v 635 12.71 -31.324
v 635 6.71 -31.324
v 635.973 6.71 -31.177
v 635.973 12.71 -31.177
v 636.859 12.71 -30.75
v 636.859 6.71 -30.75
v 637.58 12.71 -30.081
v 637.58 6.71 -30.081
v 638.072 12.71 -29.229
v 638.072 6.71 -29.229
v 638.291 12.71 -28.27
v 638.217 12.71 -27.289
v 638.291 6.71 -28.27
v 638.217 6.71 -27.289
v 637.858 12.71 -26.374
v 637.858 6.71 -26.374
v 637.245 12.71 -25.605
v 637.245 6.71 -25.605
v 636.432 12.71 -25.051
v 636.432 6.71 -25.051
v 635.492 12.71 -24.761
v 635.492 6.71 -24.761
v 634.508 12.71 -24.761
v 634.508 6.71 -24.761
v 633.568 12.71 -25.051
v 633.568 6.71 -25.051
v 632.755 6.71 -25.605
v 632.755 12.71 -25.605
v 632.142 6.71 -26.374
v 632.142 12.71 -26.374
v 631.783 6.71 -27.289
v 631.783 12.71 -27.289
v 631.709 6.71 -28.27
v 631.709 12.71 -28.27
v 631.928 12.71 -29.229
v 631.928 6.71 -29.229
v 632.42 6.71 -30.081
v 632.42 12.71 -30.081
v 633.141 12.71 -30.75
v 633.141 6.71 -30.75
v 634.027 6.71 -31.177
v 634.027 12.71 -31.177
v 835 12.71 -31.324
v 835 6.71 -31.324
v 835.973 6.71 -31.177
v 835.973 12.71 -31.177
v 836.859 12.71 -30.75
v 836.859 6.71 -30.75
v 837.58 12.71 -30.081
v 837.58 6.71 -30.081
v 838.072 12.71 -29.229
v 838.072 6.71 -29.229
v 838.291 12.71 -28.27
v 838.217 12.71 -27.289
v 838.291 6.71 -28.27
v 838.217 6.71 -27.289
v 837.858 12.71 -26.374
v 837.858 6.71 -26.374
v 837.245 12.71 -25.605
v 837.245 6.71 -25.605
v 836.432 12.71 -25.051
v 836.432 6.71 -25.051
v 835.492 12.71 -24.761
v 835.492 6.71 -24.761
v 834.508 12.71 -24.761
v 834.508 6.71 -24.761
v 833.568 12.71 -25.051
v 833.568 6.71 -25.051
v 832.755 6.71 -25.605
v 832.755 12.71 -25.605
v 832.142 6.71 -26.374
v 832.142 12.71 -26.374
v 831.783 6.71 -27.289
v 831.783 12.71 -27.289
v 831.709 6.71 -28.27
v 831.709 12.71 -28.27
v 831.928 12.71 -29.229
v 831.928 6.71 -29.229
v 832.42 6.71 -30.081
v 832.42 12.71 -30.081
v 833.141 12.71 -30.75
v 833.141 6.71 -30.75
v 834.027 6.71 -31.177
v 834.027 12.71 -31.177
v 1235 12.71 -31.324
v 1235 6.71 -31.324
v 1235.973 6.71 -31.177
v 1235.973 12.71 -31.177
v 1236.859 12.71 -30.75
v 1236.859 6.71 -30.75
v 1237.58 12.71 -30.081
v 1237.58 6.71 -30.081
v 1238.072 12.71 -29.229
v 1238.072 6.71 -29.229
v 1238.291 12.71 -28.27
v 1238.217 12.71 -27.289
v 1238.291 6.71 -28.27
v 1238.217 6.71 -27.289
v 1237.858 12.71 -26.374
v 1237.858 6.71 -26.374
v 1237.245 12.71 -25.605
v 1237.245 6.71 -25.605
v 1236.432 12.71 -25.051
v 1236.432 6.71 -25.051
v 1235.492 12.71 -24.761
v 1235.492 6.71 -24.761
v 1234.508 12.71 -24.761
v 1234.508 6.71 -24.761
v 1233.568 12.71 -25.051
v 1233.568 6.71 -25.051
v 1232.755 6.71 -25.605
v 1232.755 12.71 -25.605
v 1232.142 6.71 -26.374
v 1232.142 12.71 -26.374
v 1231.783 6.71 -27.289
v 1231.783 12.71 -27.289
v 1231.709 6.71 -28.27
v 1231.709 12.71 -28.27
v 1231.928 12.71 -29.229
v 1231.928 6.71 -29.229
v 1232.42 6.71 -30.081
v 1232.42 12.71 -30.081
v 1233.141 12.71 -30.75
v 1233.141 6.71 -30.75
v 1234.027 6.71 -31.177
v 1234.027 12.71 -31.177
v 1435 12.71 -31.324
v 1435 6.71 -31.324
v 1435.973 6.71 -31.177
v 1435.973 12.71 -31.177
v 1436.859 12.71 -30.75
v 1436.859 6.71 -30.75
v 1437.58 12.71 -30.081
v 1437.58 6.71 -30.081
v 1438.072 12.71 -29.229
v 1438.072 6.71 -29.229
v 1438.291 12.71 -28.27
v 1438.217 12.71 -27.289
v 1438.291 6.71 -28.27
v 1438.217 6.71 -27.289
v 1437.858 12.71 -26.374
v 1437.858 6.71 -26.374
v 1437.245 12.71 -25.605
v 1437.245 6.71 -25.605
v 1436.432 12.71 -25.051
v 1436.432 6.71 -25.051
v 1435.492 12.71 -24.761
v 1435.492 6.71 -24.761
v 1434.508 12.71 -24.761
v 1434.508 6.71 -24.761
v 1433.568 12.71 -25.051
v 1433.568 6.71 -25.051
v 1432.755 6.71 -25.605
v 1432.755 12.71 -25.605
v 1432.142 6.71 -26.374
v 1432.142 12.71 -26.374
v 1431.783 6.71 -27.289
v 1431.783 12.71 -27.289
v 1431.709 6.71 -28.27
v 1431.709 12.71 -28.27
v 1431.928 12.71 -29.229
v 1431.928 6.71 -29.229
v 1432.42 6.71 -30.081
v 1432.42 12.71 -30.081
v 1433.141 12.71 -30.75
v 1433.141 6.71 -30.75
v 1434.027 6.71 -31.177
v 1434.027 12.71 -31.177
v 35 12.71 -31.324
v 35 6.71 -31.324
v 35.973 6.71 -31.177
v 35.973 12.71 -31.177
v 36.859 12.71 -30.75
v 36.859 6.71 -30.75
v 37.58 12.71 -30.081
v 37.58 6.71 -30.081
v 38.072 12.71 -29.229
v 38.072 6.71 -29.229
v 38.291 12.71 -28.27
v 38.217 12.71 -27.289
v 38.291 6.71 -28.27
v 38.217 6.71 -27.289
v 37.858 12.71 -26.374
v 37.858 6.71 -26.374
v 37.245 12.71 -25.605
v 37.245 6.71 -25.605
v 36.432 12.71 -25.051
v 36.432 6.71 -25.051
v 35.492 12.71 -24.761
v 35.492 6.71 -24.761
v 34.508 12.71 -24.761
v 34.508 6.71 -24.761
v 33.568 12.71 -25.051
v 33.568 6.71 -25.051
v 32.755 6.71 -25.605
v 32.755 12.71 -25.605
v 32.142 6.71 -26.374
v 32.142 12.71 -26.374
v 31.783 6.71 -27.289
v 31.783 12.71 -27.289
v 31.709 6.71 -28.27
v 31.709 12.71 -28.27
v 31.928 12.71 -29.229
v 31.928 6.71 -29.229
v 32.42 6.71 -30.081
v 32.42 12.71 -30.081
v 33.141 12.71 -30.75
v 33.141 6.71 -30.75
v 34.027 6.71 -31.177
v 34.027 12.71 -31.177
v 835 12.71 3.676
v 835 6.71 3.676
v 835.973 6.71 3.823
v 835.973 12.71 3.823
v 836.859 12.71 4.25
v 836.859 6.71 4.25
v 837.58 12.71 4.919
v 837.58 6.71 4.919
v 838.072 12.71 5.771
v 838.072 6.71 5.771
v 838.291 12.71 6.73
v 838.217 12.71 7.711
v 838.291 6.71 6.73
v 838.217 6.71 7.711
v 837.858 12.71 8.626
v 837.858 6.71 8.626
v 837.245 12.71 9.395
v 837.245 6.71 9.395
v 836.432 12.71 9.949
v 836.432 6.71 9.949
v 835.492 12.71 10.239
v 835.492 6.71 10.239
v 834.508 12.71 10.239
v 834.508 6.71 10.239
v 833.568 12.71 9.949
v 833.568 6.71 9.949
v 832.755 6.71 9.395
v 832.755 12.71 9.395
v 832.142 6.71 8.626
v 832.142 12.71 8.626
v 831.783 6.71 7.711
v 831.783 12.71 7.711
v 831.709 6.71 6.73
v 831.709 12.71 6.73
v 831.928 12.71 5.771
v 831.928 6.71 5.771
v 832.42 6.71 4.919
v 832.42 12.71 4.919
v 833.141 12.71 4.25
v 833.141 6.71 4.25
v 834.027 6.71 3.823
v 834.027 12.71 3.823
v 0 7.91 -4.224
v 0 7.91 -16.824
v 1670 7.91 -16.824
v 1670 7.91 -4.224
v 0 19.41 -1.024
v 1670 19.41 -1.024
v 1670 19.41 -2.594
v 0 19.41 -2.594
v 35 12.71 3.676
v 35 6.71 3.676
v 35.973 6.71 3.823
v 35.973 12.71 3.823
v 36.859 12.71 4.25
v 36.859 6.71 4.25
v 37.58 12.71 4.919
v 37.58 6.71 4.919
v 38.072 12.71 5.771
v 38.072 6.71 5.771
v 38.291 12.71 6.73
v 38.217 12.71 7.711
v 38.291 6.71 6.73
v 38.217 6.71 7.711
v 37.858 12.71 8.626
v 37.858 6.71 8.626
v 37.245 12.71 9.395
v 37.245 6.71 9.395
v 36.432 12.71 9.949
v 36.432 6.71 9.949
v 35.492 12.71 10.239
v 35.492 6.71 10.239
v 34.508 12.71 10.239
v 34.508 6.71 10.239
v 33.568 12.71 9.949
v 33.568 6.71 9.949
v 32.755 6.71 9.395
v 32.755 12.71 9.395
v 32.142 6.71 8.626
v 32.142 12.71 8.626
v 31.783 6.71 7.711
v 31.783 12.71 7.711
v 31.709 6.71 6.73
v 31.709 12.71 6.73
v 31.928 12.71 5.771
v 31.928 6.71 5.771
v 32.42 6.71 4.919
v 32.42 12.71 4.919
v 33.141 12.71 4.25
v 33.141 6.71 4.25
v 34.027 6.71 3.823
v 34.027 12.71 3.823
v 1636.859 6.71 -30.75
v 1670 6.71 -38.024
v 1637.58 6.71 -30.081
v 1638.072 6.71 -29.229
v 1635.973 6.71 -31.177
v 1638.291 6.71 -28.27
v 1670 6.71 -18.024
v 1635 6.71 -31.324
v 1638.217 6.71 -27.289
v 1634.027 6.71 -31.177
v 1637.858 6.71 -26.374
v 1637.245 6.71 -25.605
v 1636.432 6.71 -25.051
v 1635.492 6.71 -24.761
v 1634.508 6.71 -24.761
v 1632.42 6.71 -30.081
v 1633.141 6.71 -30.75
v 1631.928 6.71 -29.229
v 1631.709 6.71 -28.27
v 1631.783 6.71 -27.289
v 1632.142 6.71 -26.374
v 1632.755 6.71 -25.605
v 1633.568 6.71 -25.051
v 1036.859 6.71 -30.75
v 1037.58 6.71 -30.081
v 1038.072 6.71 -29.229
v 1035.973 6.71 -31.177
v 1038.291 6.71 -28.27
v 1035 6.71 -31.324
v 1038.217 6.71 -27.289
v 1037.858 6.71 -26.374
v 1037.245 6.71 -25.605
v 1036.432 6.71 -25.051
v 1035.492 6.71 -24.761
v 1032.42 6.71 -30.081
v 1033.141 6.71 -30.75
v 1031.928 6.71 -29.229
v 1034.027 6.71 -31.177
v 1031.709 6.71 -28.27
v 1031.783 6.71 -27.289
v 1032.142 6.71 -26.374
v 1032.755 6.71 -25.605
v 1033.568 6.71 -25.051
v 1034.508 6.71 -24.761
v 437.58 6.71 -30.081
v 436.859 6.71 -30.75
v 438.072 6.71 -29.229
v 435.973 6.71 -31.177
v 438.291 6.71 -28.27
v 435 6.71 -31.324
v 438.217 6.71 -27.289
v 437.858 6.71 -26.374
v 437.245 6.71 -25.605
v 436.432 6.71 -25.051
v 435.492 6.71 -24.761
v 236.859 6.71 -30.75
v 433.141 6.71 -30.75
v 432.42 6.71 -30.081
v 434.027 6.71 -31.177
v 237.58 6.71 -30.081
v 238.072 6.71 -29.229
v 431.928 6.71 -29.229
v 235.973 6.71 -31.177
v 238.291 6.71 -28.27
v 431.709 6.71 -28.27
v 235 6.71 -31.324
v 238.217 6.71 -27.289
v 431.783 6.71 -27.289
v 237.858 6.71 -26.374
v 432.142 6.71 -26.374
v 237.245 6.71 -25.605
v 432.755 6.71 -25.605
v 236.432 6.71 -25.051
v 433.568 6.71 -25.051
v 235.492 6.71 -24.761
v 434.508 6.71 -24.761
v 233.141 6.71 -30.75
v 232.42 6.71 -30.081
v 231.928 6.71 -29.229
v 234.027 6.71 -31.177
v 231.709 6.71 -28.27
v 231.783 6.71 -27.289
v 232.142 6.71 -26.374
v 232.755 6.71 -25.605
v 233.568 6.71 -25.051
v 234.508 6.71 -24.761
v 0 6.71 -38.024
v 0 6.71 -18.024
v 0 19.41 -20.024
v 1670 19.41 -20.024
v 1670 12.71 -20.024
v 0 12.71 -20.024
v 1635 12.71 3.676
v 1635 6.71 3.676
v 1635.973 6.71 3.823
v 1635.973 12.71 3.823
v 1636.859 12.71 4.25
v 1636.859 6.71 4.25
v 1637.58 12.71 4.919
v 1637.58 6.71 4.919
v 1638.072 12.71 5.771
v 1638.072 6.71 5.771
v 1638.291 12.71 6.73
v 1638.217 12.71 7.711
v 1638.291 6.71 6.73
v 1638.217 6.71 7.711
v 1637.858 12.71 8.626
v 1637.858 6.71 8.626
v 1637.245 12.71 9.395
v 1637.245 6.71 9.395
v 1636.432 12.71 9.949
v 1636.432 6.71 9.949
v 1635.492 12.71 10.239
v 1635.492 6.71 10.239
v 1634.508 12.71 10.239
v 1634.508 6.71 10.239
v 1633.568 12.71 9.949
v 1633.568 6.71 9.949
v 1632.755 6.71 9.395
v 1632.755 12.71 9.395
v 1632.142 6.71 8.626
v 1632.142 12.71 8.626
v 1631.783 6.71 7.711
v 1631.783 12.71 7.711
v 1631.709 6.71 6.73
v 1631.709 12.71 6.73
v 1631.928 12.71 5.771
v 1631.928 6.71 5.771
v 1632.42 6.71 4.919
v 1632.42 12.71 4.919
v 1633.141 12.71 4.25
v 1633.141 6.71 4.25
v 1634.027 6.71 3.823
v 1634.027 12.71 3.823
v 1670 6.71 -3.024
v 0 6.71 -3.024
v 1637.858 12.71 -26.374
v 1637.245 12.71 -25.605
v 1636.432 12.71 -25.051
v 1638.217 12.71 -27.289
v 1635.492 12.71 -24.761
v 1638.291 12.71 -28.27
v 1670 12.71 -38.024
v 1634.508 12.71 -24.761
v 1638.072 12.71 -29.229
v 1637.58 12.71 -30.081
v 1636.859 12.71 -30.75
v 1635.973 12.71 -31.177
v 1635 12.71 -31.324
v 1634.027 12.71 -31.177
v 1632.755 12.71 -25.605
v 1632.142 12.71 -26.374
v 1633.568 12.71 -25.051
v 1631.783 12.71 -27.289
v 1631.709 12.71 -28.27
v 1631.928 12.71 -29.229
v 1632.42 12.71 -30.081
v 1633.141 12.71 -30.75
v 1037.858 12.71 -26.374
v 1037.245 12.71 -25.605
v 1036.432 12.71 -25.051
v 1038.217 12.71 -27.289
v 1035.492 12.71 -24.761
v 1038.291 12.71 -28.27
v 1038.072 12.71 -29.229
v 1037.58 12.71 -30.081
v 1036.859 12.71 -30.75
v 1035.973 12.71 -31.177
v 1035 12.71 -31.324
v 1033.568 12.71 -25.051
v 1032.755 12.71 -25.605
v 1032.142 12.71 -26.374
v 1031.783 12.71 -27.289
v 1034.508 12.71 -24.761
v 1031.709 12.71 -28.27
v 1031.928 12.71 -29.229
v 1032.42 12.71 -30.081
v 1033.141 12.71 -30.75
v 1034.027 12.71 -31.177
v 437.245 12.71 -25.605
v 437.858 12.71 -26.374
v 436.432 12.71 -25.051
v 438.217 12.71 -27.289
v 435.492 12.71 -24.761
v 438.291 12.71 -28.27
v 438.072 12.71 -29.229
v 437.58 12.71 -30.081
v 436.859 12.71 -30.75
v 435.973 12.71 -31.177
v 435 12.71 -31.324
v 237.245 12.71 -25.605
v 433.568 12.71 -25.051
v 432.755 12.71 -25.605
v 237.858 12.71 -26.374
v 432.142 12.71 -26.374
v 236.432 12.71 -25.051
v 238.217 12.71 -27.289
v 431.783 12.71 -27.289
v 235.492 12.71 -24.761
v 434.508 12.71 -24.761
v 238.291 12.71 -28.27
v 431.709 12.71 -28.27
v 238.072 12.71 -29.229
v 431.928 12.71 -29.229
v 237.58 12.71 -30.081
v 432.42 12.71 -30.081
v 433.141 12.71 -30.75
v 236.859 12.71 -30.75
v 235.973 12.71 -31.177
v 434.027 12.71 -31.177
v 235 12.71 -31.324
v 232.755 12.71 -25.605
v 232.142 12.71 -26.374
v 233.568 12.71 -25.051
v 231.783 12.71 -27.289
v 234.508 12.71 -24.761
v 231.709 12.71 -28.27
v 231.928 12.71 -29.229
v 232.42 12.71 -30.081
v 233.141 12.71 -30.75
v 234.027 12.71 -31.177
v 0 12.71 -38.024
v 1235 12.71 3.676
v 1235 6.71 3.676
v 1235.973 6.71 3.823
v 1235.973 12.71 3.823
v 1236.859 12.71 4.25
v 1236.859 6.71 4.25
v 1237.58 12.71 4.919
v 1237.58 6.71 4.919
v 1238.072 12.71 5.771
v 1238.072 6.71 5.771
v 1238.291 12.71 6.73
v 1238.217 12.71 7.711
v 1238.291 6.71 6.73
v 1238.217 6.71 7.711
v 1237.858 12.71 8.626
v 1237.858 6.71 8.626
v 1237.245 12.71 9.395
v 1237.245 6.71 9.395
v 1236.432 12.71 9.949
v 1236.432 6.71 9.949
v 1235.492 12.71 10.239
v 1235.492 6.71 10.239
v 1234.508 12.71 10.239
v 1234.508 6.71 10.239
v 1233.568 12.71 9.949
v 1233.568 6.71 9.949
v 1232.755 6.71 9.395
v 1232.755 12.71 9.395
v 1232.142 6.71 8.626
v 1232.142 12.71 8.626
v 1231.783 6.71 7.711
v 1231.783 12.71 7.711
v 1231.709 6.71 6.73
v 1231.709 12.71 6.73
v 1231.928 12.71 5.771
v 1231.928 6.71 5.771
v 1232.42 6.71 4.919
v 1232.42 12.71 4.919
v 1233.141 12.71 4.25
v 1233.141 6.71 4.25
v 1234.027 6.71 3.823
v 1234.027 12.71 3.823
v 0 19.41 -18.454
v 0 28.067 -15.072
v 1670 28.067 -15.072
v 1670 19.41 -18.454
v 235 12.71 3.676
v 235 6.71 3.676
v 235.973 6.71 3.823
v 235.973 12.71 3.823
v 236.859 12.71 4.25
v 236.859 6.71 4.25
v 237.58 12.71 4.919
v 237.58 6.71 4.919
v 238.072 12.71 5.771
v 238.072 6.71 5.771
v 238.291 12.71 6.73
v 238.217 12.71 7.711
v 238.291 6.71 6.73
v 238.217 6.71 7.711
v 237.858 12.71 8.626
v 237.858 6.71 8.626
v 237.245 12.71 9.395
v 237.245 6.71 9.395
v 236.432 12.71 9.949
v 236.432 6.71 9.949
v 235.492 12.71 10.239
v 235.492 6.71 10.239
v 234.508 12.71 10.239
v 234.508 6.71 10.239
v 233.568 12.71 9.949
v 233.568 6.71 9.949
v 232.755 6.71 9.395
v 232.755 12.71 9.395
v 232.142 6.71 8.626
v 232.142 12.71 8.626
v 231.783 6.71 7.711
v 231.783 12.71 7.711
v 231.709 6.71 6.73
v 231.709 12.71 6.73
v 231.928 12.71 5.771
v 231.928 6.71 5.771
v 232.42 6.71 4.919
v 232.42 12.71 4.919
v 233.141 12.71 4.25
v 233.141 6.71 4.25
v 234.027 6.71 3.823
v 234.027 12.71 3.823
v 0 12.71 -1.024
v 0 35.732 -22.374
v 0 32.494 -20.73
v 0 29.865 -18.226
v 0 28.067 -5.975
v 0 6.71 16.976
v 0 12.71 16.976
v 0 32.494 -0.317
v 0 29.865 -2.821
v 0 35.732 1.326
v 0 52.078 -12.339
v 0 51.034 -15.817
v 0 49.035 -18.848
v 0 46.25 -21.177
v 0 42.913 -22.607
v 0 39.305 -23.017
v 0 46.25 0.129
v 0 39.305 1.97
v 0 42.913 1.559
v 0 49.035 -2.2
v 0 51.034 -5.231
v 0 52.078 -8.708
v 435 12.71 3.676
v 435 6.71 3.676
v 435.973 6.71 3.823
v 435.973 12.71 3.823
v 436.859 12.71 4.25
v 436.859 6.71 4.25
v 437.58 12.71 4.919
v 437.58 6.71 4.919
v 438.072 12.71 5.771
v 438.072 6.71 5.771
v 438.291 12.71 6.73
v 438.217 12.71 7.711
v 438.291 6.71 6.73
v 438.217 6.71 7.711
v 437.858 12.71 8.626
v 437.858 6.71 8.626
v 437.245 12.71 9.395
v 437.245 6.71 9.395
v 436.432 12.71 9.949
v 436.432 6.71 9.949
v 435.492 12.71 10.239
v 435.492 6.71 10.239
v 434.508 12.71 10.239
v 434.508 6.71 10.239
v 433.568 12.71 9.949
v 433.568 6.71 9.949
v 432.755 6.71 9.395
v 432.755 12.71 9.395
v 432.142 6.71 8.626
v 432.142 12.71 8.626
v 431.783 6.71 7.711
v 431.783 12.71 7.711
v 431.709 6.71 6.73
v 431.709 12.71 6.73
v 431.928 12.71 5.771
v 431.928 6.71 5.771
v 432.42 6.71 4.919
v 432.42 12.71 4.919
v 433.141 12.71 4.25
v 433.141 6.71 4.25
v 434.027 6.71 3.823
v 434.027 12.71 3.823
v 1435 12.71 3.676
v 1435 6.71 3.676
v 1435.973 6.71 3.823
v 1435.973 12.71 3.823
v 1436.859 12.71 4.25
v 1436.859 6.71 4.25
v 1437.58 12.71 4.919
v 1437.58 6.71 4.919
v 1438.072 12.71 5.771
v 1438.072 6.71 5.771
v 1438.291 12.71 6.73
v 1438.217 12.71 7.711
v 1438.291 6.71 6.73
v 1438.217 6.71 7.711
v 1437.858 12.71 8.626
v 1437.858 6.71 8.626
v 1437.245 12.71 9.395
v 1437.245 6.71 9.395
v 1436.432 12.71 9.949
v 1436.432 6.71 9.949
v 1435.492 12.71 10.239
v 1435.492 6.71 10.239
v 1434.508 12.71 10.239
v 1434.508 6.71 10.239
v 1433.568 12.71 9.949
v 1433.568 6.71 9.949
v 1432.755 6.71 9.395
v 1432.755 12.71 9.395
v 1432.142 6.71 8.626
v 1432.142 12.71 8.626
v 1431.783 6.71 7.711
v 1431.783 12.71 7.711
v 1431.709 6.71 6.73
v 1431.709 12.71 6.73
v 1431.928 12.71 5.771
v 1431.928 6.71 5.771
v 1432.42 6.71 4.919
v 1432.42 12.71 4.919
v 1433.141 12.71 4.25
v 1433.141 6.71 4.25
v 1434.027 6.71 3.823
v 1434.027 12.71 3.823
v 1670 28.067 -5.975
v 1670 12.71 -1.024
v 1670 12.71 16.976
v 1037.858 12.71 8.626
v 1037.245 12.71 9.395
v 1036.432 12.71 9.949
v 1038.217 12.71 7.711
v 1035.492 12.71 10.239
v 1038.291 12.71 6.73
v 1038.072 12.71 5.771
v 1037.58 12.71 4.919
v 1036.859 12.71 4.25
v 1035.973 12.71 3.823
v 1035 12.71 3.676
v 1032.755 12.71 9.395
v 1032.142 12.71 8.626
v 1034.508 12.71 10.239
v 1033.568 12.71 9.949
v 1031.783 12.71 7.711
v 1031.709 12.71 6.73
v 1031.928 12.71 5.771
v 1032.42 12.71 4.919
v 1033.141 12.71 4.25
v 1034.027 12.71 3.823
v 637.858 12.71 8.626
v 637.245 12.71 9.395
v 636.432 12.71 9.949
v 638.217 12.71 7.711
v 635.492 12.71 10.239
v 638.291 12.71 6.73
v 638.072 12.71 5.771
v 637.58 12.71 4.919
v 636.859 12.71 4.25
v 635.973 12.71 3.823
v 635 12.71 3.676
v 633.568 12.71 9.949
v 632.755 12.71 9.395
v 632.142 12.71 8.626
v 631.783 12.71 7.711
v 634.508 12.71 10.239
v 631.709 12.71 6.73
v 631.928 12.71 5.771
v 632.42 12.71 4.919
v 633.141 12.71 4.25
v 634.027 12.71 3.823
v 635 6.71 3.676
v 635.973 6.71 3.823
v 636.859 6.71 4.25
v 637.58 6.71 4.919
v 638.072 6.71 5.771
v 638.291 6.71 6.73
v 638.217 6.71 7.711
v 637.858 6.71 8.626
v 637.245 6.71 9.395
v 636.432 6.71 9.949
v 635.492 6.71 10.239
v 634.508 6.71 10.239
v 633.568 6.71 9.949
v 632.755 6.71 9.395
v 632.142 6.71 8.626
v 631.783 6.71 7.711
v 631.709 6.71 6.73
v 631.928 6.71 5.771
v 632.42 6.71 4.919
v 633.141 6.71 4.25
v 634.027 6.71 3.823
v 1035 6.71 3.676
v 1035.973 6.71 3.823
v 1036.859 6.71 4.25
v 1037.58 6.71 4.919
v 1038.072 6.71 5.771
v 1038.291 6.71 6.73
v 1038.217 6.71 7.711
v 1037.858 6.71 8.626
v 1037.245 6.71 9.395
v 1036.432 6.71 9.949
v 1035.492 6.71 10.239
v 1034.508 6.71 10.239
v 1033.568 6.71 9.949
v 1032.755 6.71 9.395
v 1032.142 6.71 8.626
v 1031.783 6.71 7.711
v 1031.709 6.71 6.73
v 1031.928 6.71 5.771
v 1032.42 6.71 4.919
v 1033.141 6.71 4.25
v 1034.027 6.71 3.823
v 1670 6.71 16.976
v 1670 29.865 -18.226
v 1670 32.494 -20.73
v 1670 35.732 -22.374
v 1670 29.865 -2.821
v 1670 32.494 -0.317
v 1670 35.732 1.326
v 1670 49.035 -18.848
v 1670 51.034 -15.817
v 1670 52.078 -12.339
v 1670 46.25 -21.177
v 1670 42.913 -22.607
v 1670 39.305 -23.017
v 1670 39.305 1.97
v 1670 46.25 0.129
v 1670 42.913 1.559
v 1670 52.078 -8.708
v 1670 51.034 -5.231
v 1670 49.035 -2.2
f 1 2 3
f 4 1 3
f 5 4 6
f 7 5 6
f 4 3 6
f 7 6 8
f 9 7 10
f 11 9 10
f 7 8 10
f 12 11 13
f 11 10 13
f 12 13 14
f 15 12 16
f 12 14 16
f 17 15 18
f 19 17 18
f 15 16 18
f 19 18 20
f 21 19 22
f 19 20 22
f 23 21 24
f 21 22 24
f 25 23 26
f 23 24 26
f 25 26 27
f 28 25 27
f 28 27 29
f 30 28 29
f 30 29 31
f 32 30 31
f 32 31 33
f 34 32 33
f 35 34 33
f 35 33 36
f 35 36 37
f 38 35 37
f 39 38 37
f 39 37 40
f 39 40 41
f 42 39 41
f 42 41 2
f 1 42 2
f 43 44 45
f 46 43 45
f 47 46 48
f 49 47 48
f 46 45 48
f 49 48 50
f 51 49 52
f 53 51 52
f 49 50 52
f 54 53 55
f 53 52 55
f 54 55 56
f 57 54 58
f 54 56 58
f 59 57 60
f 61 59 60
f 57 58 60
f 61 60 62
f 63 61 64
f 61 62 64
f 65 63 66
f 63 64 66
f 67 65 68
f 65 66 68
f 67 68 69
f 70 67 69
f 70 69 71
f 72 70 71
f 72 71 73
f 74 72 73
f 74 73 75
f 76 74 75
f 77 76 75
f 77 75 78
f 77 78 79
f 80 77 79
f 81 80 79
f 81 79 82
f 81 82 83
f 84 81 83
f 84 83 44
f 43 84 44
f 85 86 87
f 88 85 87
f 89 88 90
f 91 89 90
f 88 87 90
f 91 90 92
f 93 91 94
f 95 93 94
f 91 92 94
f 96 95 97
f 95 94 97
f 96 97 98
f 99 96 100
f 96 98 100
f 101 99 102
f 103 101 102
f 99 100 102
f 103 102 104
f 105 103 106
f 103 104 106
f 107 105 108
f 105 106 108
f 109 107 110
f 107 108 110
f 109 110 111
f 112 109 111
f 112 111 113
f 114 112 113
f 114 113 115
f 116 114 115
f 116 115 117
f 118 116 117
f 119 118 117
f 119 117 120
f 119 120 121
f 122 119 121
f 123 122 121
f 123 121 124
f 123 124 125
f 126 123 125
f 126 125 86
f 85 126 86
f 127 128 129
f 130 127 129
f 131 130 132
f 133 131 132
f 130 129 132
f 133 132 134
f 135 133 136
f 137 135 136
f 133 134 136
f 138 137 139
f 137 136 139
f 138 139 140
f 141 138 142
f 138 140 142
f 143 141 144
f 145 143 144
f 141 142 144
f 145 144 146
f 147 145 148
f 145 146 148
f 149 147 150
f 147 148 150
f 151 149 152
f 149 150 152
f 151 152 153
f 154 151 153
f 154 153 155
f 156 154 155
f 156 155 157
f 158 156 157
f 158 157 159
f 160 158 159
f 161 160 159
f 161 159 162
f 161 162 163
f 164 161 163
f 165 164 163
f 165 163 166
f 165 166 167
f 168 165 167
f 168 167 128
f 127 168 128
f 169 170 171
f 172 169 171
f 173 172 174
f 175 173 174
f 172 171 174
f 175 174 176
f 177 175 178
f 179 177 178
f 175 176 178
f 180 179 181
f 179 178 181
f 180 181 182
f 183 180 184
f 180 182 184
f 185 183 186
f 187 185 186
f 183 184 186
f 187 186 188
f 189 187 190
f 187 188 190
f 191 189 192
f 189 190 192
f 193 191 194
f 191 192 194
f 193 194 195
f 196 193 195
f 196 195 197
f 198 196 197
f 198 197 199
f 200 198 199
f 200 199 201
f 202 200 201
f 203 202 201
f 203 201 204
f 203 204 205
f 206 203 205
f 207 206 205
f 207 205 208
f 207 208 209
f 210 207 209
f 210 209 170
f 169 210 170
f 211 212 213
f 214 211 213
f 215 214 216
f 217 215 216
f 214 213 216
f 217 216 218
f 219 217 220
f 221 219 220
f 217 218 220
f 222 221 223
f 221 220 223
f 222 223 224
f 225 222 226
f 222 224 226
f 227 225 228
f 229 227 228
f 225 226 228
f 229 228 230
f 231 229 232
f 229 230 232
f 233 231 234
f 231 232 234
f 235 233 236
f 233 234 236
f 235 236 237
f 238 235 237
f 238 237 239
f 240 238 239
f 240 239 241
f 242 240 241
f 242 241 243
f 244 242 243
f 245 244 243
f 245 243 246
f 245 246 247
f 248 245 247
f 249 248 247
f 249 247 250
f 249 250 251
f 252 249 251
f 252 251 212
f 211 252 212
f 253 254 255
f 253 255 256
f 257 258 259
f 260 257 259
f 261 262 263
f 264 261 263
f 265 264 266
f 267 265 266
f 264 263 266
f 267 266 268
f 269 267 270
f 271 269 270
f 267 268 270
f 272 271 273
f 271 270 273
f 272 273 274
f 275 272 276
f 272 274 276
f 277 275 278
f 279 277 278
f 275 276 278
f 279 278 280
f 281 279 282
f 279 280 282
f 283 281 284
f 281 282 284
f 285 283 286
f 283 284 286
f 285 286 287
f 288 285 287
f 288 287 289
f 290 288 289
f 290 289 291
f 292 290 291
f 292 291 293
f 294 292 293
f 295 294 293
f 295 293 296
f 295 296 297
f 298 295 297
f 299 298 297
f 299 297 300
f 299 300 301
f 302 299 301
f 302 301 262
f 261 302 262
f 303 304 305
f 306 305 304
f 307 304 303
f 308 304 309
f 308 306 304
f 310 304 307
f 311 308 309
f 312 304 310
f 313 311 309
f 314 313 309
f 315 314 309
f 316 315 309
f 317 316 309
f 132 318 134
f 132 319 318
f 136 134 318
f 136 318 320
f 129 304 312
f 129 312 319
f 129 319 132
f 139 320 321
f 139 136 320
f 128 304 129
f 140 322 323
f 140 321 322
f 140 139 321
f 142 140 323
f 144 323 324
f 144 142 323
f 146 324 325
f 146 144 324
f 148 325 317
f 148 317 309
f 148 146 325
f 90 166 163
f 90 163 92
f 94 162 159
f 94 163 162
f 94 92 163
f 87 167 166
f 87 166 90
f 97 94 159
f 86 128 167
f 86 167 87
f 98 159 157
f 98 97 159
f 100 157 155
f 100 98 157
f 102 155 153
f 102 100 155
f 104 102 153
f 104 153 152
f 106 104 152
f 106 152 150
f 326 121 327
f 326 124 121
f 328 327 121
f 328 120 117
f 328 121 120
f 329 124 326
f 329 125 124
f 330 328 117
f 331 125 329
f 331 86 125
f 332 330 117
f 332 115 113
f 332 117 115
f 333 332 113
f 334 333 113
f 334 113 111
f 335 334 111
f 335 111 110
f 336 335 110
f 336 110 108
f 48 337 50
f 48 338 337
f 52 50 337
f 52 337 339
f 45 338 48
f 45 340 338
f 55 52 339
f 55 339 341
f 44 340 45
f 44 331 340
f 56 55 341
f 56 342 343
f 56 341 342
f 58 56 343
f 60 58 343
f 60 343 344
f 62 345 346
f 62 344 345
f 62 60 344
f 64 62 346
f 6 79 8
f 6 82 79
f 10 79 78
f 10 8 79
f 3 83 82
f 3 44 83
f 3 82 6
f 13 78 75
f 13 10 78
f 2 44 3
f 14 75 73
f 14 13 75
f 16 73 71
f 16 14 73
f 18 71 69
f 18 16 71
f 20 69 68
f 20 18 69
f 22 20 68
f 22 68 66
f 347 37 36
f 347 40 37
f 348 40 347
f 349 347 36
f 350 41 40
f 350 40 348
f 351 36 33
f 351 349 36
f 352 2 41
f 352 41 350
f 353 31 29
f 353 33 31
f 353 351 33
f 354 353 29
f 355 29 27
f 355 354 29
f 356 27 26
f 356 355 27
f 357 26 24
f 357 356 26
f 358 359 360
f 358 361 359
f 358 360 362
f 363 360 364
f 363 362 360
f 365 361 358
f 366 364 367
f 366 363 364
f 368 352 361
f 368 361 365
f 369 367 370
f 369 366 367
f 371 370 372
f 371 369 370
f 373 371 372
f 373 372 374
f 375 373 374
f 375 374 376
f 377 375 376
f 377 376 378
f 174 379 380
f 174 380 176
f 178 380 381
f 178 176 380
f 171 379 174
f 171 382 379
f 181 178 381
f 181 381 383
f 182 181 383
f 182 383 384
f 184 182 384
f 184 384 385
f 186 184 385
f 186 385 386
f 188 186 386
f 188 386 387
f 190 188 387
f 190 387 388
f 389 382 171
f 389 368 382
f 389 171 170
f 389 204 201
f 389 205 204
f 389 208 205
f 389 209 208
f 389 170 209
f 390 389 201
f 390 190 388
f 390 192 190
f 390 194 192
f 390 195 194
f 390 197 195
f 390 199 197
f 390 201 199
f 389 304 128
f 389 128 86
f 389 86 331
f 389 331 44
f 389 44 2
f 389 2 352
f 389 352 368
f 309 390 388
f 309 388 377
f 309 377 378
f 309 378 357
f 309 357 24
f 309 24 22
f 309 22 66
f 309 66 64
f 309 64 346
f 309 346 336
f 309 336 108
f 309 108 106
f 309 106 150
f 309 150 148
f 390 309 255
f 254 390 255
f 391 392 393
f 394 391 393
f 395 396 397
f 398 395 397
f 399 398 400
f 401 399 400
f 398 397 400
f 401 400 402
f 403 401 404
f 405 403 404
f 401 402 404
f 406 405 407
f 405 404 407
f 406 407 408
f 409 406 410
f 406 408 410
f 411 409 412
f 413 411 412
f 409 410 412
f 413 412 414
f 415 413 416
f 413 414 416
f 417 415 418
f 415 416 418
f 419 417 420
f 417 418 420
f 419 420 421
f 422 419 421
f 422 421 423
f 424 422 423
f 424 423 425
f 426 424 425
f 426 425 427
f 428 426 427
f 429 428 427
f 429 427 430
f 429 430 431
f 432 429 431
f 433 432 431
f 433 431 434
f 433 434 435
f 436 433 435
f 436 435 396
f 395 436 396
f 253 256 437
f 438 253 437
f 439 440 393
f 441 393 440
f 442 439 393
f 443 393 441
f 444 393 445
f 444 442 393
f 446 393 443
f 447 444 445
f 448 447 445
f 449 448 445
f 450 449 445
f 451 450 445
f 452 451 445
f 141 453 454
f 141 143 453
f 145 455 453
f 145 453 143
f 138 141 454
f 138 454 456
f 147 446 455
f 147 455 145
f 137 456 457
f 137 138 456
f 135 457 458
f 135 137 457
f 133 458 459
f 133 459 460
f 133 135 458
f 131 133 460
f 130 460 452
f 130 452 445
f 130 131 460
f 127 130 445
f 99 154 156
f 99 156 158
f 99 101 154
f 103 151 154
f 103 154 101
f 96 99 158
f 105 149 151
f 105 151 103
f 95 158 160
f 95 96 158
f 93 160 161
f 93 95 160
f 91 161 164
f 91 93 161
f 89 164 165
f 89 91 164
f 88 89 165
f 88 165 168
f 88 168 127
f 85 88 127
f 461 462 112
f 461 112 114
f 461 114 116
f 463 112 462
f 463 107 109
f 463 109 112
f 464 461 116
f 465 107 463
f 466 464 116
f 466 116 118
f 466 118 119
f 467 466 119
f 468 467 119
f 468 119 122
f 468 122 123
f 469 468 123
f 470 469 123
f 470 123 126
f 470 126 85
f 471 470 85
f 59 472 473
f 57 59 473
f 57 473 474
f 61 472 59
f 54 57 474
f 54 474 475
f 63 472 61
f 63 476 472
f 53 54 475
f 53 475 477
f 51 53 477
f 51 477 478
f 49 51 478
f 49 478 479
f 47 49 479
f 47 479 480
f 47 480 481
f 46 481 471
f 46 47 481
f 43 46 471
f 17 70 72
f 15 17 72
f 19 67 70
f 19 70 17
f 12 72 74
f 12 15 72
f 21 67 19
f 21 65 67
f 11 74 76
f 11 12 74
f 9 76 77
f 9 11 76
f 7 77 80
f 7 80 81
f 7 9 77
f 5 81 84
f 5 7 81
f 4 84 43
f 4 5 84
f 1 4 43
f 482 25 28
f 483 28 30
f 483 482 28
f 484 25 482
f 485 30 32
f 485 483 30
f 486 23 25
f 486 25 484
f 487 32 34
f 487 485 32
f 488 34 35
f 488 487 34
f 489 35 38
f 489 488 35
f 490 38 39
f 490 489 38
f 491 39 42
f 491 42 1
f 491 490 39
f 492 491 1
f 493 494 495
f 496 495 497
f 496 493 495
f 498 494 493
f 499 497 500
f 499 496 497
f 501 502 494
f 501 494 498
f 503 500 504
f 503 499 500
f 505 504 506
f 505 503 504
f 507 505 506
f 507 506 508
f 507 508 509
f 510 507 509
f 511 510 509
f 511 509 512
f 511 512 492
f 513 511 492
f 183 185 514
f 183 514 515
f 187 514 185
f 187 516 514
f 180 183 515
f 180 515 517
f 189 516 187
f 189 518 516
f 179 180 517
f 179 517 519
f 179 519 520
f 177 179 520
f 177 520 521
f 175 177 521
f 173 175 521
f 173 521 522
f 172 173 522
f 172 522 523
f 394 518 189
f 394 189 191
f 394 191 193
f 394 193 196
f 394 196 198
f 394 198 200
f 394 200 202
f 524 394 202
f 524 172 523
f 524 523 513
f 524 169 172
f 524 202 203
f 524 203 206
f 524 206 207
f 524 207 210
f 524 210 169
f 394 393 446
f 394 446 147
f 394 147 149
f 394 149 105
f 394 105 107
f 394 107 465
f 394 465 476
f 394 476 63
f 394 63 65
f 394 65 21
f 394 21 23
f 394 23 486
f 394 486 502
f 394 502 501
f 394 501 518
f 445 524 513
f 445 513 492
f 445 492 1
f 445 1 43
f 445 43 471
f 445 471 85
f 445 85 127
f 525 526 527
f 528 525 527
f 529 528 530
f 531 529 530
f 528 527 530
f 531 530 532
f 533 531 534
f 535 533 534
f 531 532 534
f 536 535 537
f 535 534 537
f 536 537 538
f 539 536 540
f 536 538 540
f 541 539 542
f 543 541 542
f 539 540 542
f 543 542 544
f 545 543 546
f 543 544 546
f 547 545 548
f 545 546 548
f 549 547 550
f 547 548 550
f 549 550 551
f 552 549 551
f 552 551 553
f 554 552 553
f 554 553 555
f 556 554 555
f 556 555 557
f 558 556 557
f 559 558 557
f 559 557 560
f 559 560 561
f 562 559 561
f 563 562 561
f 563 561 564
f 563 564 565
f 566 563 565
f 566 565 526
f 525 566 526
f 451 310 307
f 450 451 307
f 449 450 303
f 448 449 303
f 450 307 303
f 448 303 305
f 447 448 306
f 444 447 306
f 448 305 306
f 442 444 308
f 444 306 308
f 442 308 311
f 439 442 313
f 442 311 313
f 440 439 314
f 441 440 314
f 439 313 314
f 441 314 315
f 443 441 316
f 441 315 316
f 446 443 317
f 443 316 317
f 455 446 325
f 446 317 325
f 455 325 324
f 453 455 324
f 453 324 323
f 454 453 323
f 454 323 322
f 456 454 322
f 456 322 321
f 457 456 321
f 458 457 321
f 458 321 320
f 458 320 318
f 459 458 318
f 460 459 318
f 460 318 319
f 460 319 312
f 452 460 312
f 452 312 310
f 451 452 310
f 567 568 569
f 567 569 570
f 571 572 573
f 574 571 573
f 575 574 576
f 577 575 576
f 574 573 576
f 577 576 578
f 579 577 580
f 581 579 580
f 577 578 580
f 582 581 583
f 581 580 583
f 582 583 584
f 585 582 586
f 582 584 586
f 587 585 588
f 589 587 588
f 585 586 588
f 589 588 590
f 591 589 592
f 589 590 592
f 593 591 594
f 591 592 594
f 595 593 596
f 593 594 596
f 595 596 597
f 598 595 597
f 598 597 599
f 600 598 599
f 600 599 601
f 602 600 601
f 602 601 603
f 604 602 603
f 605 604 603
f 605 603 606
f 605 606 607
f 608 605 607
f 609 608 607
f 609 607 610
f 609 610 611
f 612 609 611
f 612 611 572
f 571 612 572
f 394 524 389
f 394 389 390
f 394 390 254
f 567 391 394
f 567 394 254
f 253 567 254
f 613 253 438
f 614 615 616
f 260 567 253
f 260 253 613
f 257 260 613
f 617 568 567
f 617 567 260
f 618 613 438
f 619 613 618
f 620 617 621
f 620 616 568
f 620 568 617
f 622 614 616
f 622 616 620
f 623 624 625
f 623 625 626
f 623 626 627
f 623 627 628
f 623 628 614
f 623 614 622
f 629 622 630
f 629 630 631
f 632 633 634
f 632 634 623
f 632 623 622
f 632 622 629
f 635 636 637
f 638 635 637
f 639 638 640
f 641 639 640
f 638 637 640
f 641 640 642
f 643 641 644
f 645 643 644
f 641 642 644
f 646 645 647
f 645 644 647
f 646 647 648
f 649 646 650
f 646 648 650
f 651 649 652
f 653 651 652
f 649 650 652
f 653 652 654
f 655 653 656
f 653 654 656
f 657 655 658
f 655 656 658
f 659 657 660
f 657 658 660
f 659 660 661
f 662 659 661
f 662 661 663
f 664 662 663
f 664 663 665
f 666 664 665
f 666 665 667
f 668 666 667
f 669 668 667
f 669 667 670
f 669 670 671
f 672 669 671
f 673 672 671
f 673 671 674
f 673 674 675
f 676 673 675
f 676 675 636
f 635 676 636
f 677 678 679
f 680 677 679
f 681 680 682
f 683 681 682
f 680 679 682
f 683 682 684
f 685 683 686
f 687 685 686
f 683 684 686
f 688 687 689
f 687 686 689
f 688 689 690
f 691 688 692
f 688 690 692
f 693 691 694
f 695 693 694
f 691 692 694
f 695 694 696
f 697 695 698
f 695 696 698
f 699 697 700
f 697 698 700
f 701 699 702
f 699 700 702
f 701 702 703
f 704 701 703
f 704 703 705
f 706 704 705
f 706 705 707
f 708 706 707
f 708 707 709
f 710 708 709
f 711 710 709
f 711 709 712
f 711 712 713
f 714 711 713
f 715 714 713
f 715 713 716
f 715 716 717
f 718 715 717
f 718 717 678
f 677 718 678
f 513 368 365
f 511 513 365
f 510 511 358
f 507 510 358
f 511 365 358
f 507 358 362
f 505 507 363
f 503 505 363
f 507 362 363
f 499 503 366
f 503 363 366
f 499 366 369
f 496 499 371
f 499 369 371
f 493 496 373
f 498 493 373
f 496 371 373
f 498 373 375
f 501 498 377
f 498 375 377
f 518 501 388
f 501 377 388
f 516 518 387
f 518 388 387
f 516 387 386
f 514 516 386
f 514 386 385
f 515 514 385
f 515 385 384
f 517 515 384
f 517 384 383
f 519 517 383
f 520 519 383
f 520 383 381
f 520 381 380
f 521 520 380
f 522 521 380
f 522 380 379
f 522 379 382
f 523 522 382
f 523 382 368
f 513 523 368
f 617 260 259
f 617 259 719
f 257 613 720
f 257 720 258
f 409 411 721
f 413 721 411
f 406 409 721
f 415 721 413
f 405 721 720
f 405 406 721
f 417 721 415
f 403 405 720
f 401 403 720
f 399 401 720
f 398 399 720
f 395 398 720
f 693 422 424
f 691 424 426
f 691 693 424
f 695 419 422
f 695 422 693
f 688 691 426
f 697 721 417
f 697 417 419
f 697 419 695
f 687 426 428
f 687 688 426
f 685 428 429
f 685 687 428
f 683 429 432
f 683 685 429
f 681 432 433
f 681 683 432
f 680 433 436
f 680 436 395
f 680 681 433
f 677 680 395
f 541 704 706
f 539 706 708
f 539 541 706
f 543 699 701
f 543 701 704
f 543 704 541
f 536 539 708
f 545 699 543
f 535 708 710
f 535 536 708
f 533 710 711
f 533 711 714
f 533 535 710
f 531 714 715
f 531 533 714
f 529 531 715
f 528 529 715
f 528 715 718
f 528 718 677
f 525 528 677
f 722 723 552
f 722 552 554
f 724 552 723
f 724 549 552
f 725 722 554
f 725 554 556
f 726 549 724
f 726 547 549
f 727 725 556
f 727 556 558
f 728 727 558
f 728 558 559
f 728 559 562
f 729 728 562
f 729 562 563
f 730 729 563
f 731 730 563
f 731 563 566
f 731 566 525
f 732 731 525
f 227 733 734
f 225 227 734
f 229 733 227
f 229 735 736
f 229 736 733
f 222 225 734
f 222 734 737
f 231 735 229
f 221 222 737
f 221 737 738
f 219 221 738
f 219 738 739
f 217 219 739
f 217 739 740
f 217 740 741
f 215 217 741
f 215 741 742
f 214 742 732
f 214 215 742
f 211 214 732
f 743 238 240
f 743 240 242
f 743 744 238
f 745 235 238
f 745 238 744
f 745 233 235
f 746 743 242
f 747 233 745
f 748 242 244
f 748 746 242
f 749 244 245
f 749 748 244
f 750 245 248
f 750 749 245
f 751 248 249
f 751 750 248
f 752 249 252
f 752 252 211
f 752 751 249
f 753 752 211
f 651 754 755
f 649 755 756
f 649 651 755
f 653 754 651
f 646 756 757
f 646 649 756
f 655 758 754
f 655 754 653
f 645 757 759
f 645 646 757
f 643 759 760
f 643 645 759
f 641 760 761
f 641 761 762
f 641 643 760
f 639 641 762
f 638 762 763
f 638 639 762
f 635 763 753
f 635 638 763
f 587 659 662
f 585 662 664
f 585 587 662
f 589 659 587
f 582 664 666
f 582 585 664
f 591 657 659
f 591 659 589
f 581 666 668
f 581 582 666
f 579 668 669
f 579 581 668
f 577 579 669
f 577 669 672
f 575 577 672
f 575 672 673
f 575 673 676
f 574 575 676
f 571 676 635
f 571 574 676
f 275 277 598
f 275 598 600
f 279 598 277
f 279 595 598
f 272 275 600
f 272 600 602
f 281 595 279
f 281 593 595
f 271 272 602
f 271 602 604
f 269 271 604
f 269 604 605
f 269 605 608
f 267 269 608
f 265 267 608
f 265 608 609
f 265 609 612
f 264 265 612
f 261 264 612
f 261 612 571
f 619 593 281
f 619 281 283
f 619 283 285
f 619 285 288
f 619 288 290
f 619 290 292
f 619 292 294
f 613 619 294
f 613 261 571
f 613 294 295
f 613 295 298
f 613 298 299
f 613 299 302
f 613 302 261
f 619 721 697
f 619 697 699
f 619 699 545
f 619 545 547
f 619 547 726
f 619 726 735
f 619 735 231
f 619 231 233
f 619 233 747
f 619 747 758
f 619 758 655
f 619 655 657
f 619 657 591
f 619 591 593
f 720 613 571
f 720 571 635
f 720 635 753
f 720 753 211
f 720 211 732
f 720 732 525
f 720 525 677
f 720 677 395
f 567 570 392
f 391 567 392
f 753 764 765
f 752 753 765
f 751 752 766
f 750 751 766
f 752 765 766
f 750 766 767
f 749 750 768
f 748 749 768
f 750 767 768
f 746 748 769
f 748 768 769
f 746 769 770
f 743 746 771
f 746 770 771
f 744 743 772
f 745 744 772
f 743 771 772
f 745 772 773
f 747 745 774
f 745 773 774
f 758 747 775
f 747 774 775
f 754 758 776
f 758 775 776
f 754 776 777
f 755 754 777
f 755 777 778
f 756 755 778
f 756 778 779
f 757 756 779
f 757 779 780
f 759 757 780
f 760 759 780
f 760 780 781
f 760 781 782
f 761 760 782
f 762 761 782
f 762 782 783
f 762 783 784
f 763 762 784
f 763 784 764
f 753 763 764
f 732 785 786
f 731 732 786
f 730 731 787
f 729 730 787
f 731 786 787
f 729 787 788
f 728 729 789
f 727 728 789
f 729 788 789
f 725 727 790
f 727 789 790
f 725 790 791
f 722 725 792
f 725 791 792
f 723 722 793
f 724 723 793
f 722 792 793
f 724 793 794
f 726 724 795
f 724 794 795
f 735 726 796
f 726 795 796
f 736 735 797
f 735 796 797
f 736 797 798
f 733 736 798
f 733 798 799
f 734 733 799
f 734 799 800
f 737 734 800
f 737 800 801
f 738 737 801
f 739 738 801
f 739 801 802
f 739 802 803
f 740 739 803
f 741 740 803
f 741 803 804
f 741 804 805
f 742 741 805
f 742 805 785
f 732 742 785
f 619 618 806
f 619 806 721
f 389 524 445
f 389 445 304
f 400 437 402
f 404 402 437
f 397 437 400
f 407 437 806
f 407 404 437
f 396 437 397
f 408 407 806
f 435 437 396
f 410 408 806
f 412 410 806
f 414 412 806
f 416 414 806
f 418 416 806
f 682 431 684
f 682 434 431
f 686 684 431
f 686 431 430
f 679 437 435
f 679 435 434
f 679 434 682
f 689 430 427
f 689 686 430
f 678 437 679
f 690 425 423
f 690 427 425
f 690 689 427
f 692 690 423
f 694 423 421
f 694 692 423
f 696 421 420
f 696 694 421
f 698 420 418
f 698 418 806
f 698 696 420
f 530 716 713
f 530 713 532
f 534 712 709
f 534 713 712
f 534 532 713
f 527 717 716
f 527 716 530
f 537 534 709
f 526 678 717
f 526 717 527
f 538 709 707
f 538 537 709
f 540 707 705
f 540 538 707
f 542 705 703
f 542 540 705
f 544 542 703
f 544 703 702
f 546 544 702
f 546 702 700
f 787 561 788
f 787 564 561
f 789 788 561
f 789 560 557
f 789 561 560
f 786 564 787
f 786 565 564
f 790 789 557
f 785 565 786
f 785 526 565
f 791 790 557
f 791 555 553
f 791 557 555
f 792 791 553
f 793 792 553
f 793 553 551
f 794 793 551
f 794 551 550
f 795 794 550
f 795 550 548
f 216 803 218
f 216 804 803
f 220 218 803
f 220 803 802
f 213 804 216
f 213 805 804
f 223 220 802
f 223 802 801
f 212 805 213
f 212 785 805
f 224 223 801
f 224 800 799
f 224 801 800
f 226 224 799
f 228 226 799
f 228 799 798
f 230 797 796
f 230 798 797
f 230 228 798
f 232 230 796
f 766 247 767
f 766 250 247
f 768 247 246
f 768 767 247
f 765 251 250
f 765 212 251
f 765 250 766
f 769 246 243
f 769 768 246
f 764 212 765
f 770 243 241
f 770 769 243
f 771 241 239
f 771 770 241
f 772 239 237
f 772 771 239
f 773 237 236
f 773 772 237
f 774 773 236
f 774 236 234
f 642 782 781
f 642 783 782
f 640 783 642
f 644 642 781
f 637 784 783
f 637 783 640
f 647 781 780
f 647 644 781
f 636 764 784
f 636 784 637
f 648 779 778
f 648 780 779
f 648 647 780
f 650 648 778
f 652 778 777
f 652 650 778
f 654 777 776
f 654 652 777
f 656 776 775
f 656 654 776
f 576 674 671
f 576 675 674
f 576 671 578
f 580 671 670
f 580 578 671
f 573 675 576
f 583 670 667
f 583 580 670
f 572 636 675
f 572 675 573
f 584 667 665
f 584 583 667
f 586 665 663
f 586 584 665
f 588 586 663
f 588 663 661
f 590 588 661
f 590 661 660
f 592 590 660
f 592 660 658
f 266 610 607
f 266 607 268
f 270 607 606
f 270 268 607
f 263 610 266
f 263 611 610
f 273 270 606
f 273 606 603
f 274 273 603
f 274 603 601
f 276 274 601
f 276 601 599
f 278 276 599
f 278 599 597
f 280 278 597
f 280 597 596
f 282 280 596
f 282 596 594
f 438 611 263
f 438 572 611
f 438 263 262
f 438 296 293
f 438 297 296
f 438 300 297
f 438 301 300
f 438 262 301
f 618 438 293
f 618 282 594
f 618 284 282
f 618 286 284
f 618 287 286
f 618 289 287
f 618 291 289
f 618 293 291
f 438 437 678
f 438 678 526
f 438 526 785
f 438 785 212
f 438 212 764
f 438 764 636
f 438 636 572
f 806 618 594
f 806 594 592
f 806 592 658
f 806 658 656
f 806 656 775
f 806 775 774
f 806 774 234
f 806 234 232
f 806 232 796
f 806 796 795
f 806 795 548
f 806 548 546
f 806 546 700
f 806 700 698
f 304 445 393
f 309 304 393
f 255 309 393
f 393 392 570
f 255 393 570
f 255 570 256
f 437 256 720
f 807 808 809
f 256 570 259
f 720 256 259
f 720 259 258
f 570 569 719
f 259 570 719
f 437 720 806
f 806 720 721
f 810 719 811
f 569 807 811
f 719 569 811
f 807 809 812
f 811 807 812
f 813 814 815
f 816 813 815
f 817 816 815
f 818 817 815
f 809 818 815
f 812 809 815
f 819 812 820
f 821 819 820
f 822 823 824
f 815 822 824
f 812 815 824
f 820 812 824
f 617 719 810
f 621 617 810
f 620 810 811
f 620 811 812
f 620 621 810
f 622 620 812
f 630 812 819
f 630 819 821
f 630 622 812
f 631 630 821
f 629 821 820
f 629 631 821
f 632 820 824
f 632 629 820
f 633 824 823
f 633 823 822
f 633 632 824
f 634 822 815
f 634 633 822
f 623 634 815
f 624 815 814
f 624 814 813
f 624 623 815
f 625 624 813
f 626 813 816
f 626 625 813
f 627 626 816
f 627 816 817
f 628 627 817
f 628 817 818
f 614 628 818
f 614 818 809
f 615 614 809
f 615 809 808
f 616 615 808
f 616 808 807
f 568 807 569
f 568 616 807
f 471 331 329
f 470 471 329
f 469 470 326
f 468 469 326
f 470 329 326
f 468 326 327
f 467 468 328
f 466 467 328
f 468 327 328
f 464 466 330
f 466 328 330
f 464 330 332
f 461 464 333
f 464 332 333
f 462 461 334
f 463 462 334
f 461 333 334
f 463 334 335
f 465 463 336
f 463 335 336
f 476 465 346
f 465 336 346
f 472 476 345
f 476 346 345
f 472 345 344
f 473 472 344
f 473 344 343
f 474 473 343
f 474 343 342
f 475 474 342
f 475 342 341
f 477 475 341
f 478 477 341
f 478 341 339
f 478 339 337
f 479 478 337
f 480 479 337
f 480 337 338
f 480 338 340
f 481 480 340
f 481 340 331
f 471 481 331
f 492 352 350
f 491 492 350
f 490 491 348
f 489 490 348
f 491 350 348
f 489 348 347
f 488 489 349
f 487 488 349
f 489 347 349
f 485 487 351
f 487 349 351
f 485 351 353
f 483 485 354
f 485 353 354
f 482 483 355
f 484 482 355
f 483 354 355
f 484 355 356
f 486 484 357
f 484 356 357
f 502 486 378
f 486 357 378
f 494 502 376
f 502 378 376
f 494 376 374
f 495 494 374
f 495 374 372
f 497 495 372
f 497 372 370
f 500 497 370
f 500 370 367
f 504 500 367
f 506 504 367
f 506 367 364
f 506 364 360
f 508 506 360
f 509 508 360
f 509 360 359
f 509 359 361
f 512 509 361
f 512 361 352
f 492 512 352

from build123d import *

# Parameters (mm, degrees)
EXTRUDE_1_DEPTH         = 1670
HOLE_WIZARD_6_6_6_6_1_D = 6.6
PATTERN_LINEAR_1_COUNT  = 9
PATTERN_LINEAR_1_PITCH  = 200


with BuildPart() as part:
    # 草图1 → 凸台-拉伸1 (new body)
    with BuildSketch(Plane(origin=(0, 0, 0), x_dir=(0, 0, -1), z_dir=(1, 0, 0))):
        with BuildLine():
            Line((38.023703704, 12.710240583), (38.023703704, 6.710240583))
            Line((38.023703704, 6.710240583), (18.023703704, 6.710240583))
            Line((18.023703704, 6.710240583), (16.823703704, 7.910240583))
            Line((16.823703704, 7.910240583), (4.223703704, 7.910240583))
            Line((4.223703704, 7.910240583), (3.023703704, 6.710240583))
            Line((3.023703704, 6.710240583), (-16.976296296, 6.710240583))
            Line((-16.976296296, 6.710240583), (-16.976296296, 12.710240583))
            Line((-16.976296296, 12.710240583), (1.023703704, 12.710240583))
            Line((1.023703704, 12.710240583), (1.023703704, 19.410240583))
            Line((1.023703704, 19.410240583), (2.593703704, 19.410240583))
            Line((2.593703704, 19.410240583), (5.975416608, 28.06708446))
            ThreePointArc((5.975416608, 28.06708446), (10.523703704, 52.210240583), (15.0719908, 28.06708446))
            Line((15.0719908, 28.06708446), (18.453703704, 19.410240583))
            Line((18.453703704, 19.410240583), (20.023703704, 19.410240583))
            Line((20.023703704, 19.410240583), (20.023703704, 12.710240583))
            Line((20.023703704, 12.710240583), (38.023703704, 12.710240583))
        make_face()
    extrude(amount=EXTRUDE_1_DEPTH)

    # Ø6.6 (6.6) 直径孔1 (through all)
    with Locations(Plane(origin=(35, 12.710240583, -28.023703704), x_dir=(0, 0, 1), z_dir=(0, 1, 0))):
        with Locations((0, 0), (35, 0)):
            hole_wizard_6_6_6_6_1 = Hole(HOLE_WIZARD_6_6_6_6_1_D / 2)

    # 阵列(线性)1: Ø6.6 (6.6) 直径孔1 ×9
    with Locations(*[(i * PATTERN_LINEAR_1_PITCH, 0, 0) for i in range(1, PATTERN_LINEAR_1_COUNT)]):
        add(hole_wizard_6_6_6_6_1, mode=Mode.SUBTRACT)


solid = part.part
